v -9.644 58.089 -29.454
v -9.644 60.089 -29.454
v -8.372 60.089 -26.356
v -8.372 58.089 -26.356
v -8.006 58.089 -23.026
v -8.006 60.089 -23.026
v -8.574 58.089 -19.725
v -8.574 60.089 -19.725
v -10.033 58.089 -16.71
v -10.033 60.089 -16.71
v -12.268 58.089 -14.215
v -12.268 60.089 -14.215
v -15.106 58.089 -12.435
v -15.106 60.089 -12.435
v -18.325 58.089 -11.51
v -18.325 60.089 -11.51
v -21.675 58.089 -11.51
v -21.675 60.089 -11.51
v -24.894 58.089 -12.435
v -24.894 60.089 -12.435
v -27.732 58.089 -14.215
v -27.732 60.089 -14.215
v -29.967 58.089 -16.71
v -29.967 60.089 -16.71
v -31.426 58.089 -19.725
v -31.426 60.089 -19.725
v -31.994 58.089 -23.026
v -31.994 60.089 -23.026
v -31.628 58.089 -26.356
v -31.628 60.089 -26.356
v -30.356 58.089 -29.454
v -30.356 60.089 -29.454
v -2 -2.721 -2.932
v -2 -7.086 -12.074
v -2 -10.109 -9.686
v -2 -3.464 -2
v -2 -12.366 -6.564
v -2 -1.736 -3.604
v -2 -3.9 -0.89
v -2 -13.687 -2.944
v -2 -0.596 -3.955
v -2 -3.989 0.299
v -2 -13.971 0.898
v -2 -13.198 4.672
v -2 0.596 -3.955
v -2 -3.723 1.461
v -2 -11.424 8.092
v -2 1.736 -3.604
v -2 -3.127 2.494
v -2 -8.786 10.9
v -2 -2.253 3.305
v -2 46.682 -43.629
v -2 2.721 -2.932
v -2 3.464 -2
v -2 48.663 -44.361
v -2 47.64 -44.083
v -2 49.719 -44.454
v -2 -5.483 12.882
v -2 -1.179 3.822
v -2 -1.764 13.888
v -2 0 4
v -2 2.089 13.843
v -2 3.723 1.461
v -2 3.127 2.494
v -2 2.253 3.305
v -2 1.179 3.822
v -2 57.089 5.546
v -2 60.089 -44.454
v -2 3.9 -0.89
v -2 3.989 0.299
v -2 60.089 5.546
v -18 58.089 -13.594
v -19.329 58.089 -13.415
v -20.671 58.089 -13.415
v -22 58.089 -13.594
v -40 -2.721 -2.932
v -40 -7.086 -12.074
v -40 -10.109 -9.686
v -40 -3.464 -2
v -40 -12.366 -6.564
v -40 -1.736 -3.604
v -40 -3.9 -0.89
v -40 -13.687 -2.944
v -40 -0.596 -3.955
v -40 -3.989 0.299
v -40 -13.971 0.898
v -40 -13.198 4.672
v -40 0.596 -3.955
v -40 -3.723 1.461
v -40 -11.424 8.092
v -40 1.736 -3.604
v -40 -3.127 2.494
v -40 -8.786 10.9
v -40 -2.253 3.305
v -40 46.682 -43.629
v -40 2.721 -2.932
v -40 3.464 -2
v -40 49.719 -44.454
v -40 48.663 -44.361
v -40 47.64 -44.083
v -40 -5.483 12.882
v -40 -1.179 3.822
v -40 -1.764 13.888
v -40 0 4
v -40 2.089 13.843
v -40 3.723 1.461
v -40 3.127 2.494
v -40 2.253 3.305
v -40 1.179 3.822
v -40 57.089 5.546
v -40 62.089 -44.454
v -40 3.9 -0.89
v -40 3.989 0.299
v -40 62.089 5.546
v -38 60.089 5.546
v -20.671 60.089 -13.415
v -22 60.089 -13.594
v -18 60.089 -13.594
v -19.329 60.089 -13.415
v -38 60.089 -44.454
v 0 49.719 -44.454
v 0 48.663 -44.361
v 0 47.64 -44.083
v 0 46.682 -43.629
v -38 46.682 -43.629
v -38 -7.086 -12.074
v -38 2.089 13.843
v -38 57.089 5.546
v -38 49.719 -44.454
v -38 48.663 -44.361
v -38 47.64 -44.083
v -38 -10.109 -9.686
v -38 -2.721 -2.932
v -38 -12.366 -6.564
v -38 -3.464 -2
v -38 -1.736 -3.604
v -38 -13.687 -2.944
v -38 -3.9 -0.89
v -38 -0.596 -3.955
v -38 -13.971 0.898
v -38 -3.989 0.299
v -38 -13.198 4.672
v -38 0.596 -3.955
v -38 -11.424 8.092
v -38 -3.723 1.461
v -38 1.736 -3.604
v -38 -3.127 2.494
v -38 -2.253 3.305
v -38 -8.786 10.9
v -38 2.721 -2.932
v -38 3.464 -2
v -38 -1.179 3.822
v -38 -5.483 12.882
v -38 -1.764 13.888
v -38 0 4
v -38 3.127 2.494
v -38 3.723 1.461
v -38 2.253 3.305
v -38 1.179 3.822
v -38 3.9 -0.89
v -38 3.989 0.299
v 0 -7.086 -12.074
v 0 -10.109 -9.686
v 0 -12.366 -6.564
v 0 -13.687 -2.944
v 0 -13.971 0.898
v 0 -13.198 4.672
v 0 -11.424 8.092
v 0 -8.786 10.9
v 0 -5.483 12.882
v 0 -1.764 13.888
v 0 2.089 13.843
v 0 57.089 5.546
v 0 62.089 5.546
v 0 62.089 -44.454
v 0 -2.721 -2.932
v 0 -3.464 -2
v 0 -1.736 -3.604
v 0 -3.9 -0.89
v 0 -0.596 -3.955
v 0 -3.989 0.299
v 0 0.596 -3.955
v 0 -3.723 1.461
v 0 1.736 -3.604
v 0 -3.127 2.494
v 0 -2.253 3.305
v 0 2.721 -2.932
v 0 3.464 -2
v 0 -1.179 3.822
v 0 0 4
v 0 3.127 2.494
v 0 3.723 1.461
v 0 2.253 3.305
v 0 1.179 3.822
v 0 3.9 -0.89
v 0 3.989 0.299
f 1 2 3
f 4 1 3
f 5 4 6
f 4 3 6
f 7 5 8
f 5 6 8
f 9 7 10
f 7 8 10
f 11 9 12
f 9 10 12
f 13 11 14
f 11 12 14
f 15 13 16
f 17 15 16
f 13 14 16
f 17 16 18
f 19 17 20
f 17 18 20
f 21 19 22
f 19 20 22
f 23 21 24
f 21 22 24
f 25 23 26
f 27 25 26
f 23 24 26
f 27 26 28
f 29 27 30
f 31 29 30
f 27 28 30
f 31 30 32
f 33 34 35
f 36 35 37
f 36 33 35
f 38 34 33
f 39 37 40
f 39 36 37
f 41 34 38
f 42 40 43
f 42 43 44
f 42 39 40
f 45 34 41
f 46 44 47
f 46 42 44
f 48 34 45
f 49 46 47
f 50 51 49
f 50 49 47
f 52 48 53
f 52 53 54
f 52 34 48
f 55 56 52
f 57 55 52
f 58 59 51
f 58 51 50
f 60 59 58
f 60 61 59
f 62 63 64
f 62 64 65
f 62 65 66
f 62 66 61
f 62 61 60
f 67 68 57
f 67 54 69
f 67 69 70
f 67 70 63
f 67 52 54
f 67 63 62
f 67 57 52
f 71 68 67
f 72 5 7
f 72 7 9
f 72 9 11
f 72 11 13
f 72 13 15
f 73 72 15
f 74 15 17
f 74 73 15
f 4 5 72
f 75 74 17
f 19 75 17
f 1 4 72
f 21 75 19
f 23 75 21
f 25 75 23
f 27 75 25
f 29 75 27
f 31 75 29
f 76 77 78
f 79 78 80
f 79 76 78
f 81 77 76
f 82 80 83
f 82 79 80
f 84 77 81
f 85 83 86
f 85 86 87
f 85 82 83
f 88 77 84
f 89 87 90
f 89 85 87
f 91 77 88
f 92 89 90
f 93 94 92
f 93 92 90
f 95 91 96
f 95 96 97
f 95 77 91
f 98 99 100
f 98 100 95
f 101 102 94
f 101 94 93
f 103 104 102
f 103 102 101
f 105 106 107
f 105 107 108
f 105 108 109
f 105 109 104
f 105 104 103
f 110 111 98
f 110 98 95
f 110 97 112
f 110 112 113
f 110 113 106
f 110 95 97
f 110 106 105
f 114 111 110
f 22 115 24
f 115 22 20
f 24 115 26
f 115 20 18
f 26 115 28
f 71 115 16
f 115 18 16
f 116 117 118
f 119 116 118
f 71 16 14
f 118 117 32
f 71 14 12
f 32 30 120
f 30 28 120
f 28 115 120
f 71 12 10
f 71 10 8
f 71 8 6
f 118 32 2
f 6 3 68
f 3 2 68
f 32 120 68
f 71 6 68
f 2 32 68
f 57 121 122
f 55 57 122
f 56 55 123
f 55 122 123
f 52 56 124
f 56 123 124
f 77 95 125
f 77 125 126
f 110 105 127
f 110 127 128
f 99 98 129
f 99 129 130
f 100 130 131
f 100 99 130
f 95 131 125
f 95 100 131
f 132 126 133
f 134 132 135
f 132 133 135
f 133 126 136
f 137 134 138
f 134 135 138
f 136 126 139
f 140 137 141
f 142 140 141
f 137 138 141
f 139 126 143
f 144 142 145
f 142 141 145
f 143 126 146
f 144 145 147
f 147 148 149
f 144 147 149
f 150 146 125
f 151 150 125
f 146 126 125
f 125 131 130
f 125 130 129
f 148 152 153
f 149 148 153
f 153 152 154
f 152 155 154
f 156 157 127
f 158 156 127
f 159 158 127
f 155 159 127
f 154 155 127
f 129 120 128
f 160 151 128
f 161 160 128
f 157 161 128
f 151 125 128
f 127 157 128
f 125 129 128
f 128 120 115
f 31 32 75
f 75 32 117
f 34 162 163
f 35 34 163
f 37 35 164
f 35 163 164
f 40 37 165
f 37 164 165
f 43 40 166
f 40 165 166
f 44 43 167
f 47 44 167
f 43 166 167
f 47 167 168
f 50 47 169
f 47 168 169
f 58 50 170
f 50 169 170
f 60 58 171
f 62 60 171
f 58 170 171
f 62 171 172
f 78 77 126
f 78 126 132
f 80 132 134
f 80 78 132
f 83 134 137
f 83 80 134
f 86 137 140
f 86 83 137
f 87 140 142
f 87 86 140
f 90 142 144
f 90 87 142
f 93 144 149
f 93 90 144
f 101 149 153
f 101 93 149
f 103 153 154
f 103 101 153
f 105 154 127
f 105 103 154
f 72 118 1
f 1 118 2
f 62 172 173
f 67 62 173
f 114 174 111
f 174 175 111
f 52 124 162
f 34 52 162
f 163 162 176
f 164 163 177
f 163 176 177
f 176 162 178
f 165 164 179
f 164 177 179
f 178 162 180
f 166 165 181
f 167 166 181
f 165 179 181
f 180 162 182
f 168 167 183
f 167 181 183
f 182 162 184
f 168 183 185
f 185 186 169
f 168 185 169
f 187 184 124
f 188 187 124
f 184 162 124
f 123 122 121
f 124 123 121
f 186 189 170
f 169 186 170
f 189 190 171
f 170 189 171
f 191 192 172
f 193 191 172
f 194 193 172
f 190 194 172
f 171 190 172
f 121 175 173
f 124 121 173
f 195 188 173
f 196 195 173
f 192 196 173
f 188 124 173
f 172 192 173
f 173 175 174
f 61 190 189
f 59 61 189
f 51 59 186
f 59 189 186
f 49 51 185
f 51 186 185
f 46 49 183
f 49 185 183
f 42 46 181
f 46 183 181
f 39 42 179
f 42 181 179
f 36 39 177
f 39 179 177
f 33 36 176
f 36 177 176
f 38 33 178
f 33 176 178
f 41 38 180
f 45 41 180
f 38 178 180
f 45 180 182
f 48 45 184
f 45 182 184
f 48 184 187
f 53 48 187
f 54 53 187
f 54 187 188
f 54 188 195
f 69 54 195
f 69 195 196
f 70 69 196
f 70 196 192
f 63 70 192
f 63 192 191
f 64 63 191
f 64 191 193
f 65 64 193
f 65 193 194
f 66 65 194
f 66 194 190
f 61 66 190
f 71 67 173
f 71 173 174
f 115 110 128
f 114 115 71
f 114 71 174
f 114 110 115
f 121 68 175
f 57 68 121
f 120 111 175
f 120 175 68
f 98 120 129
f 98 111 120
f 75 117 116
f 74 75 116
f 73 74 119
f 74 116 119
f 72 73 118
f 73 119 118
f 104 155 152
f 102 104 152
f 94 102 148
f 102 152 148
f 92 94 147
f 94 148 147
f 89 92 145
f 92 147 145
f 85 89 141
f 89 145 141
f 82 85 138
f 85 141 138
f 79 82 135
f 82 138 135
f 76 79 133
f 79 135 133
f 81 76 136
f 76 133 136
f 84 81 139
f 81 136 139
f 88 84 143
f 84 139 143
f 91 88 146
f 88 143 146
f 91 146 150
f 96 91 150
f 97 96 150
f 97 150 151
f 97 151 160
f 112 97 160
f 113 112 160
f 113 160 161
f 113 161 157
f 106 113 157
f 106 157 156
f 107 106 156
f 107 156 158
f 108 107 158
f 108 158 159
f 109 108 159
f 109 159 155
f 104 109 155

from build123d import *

# Parameters (mm, degrees)
BOSS_EXTRUDE1_DEPTH = 2
SKETCH2_W           = 40
SKETCH2_H           = 50
BOSS_EXTRUDE2_DEPTH = 2
BOSS_EXTRUDE3_DEPTH = 4
SKETCH5_R           = 4
CUT_EXTRUDE2_DEPTH  = 44


with BuildPart() as part:
    # Sketch1 → Boss-Extrude1 (new body)
    with BuildSketch(Plane(origin=(0, 0, 0), x_dir=(0, 0, -1), z_dir=(1, 0, 0))):
        with BuildLine():
            Line((-13.843343537, 2.088501785), (-5.545666183, 57.088501785))
            Line((-5.545666183, 57.088501785), (-5.545666183, 62.088501785))
            Line((-5.545666183, 62.088501785), (44.454333817, 62.088501785))
            Line((44.454333817, 62.088501785), (44.454333817, 49.719071836))
            ThreePointArc((44.454333817, 49.719071836), (44.244333611, 48.145571793), (43.629033022, 46.682216861))
            Line((43.629033022, 46.682216861), (12.074298145, -7.085994941))
            ThreePointArc((12.074298145, -7.085994941), (-4.671747847, -13.197529013), (-13.843343537, 2.088501785))
        make_face()
    extrude(amount=-BOSS_EXTRUDE1_DEPTH)


with BuildPart() as body_2:
    # Mirror1: mirrored copy
    add(part.part.mirror(Plane(origin=(-20, 0, 0), x_dir=(0, 0, 1), z_dir=(1, 0, 0))))


with BuildPart() as part_1:
    add(part.part)

    add(body_2.part)  # Boss-Extrude2 merges body 2
    # Sketch2 → Boss-Extrude2 (add)
    with BuildSketch(Plane(origin=(0, 62.088501785, 0), x_dir=(1, 0, 0), z_dir=(0, 1, 0))):
        with Locations((-20, 19.454333817)):
            Rectangle(SKETCH2_W, SKETCH2_H)
    extrude(amount=-BOSS_EXTRUDE2_DEPTH)

    # Sketch3 → Boss-Extrude3 (add)
    with BuildSketch(Plane(origin=(0, 62.088501785, 0), x_dir=(1, 0, 0), z_dir=(0, 1, 0))):
        with BuildLine():
            Line((-18, 13.59419702), (-9.643842411, 29.454333817))
            ThreePointArc((-9.643842411, 29.454333817), (-20, 11.392155991), (-30.356157589, 29.454333817))
            Line((-30.356157589, 29.454333817), (-22, 13.59419702))
            ThreePointArc((-22, 13.59419702), (-20, 13.392155991), (-18, 13.59419702))
        make_face()
    extrude(amount=-BOSS_EXTRUDE3_DEPTH)

    # Sketch5 → Cut-Extrude2 (cut)
    with BuildSketch(Plane(origin=(0, 0, 0), x_dir=(0, 0, -1), z_dir=(1, 0, 0))):
        with Locations(Location((0, 0, 0), (0, 0, 180))):
            Circle(SKETCH5_R)
    extrude(amount=-CUT_EXTRUDE2_DEPTH, mode=Mode.SUBTRACT)


solid = part_1.part
